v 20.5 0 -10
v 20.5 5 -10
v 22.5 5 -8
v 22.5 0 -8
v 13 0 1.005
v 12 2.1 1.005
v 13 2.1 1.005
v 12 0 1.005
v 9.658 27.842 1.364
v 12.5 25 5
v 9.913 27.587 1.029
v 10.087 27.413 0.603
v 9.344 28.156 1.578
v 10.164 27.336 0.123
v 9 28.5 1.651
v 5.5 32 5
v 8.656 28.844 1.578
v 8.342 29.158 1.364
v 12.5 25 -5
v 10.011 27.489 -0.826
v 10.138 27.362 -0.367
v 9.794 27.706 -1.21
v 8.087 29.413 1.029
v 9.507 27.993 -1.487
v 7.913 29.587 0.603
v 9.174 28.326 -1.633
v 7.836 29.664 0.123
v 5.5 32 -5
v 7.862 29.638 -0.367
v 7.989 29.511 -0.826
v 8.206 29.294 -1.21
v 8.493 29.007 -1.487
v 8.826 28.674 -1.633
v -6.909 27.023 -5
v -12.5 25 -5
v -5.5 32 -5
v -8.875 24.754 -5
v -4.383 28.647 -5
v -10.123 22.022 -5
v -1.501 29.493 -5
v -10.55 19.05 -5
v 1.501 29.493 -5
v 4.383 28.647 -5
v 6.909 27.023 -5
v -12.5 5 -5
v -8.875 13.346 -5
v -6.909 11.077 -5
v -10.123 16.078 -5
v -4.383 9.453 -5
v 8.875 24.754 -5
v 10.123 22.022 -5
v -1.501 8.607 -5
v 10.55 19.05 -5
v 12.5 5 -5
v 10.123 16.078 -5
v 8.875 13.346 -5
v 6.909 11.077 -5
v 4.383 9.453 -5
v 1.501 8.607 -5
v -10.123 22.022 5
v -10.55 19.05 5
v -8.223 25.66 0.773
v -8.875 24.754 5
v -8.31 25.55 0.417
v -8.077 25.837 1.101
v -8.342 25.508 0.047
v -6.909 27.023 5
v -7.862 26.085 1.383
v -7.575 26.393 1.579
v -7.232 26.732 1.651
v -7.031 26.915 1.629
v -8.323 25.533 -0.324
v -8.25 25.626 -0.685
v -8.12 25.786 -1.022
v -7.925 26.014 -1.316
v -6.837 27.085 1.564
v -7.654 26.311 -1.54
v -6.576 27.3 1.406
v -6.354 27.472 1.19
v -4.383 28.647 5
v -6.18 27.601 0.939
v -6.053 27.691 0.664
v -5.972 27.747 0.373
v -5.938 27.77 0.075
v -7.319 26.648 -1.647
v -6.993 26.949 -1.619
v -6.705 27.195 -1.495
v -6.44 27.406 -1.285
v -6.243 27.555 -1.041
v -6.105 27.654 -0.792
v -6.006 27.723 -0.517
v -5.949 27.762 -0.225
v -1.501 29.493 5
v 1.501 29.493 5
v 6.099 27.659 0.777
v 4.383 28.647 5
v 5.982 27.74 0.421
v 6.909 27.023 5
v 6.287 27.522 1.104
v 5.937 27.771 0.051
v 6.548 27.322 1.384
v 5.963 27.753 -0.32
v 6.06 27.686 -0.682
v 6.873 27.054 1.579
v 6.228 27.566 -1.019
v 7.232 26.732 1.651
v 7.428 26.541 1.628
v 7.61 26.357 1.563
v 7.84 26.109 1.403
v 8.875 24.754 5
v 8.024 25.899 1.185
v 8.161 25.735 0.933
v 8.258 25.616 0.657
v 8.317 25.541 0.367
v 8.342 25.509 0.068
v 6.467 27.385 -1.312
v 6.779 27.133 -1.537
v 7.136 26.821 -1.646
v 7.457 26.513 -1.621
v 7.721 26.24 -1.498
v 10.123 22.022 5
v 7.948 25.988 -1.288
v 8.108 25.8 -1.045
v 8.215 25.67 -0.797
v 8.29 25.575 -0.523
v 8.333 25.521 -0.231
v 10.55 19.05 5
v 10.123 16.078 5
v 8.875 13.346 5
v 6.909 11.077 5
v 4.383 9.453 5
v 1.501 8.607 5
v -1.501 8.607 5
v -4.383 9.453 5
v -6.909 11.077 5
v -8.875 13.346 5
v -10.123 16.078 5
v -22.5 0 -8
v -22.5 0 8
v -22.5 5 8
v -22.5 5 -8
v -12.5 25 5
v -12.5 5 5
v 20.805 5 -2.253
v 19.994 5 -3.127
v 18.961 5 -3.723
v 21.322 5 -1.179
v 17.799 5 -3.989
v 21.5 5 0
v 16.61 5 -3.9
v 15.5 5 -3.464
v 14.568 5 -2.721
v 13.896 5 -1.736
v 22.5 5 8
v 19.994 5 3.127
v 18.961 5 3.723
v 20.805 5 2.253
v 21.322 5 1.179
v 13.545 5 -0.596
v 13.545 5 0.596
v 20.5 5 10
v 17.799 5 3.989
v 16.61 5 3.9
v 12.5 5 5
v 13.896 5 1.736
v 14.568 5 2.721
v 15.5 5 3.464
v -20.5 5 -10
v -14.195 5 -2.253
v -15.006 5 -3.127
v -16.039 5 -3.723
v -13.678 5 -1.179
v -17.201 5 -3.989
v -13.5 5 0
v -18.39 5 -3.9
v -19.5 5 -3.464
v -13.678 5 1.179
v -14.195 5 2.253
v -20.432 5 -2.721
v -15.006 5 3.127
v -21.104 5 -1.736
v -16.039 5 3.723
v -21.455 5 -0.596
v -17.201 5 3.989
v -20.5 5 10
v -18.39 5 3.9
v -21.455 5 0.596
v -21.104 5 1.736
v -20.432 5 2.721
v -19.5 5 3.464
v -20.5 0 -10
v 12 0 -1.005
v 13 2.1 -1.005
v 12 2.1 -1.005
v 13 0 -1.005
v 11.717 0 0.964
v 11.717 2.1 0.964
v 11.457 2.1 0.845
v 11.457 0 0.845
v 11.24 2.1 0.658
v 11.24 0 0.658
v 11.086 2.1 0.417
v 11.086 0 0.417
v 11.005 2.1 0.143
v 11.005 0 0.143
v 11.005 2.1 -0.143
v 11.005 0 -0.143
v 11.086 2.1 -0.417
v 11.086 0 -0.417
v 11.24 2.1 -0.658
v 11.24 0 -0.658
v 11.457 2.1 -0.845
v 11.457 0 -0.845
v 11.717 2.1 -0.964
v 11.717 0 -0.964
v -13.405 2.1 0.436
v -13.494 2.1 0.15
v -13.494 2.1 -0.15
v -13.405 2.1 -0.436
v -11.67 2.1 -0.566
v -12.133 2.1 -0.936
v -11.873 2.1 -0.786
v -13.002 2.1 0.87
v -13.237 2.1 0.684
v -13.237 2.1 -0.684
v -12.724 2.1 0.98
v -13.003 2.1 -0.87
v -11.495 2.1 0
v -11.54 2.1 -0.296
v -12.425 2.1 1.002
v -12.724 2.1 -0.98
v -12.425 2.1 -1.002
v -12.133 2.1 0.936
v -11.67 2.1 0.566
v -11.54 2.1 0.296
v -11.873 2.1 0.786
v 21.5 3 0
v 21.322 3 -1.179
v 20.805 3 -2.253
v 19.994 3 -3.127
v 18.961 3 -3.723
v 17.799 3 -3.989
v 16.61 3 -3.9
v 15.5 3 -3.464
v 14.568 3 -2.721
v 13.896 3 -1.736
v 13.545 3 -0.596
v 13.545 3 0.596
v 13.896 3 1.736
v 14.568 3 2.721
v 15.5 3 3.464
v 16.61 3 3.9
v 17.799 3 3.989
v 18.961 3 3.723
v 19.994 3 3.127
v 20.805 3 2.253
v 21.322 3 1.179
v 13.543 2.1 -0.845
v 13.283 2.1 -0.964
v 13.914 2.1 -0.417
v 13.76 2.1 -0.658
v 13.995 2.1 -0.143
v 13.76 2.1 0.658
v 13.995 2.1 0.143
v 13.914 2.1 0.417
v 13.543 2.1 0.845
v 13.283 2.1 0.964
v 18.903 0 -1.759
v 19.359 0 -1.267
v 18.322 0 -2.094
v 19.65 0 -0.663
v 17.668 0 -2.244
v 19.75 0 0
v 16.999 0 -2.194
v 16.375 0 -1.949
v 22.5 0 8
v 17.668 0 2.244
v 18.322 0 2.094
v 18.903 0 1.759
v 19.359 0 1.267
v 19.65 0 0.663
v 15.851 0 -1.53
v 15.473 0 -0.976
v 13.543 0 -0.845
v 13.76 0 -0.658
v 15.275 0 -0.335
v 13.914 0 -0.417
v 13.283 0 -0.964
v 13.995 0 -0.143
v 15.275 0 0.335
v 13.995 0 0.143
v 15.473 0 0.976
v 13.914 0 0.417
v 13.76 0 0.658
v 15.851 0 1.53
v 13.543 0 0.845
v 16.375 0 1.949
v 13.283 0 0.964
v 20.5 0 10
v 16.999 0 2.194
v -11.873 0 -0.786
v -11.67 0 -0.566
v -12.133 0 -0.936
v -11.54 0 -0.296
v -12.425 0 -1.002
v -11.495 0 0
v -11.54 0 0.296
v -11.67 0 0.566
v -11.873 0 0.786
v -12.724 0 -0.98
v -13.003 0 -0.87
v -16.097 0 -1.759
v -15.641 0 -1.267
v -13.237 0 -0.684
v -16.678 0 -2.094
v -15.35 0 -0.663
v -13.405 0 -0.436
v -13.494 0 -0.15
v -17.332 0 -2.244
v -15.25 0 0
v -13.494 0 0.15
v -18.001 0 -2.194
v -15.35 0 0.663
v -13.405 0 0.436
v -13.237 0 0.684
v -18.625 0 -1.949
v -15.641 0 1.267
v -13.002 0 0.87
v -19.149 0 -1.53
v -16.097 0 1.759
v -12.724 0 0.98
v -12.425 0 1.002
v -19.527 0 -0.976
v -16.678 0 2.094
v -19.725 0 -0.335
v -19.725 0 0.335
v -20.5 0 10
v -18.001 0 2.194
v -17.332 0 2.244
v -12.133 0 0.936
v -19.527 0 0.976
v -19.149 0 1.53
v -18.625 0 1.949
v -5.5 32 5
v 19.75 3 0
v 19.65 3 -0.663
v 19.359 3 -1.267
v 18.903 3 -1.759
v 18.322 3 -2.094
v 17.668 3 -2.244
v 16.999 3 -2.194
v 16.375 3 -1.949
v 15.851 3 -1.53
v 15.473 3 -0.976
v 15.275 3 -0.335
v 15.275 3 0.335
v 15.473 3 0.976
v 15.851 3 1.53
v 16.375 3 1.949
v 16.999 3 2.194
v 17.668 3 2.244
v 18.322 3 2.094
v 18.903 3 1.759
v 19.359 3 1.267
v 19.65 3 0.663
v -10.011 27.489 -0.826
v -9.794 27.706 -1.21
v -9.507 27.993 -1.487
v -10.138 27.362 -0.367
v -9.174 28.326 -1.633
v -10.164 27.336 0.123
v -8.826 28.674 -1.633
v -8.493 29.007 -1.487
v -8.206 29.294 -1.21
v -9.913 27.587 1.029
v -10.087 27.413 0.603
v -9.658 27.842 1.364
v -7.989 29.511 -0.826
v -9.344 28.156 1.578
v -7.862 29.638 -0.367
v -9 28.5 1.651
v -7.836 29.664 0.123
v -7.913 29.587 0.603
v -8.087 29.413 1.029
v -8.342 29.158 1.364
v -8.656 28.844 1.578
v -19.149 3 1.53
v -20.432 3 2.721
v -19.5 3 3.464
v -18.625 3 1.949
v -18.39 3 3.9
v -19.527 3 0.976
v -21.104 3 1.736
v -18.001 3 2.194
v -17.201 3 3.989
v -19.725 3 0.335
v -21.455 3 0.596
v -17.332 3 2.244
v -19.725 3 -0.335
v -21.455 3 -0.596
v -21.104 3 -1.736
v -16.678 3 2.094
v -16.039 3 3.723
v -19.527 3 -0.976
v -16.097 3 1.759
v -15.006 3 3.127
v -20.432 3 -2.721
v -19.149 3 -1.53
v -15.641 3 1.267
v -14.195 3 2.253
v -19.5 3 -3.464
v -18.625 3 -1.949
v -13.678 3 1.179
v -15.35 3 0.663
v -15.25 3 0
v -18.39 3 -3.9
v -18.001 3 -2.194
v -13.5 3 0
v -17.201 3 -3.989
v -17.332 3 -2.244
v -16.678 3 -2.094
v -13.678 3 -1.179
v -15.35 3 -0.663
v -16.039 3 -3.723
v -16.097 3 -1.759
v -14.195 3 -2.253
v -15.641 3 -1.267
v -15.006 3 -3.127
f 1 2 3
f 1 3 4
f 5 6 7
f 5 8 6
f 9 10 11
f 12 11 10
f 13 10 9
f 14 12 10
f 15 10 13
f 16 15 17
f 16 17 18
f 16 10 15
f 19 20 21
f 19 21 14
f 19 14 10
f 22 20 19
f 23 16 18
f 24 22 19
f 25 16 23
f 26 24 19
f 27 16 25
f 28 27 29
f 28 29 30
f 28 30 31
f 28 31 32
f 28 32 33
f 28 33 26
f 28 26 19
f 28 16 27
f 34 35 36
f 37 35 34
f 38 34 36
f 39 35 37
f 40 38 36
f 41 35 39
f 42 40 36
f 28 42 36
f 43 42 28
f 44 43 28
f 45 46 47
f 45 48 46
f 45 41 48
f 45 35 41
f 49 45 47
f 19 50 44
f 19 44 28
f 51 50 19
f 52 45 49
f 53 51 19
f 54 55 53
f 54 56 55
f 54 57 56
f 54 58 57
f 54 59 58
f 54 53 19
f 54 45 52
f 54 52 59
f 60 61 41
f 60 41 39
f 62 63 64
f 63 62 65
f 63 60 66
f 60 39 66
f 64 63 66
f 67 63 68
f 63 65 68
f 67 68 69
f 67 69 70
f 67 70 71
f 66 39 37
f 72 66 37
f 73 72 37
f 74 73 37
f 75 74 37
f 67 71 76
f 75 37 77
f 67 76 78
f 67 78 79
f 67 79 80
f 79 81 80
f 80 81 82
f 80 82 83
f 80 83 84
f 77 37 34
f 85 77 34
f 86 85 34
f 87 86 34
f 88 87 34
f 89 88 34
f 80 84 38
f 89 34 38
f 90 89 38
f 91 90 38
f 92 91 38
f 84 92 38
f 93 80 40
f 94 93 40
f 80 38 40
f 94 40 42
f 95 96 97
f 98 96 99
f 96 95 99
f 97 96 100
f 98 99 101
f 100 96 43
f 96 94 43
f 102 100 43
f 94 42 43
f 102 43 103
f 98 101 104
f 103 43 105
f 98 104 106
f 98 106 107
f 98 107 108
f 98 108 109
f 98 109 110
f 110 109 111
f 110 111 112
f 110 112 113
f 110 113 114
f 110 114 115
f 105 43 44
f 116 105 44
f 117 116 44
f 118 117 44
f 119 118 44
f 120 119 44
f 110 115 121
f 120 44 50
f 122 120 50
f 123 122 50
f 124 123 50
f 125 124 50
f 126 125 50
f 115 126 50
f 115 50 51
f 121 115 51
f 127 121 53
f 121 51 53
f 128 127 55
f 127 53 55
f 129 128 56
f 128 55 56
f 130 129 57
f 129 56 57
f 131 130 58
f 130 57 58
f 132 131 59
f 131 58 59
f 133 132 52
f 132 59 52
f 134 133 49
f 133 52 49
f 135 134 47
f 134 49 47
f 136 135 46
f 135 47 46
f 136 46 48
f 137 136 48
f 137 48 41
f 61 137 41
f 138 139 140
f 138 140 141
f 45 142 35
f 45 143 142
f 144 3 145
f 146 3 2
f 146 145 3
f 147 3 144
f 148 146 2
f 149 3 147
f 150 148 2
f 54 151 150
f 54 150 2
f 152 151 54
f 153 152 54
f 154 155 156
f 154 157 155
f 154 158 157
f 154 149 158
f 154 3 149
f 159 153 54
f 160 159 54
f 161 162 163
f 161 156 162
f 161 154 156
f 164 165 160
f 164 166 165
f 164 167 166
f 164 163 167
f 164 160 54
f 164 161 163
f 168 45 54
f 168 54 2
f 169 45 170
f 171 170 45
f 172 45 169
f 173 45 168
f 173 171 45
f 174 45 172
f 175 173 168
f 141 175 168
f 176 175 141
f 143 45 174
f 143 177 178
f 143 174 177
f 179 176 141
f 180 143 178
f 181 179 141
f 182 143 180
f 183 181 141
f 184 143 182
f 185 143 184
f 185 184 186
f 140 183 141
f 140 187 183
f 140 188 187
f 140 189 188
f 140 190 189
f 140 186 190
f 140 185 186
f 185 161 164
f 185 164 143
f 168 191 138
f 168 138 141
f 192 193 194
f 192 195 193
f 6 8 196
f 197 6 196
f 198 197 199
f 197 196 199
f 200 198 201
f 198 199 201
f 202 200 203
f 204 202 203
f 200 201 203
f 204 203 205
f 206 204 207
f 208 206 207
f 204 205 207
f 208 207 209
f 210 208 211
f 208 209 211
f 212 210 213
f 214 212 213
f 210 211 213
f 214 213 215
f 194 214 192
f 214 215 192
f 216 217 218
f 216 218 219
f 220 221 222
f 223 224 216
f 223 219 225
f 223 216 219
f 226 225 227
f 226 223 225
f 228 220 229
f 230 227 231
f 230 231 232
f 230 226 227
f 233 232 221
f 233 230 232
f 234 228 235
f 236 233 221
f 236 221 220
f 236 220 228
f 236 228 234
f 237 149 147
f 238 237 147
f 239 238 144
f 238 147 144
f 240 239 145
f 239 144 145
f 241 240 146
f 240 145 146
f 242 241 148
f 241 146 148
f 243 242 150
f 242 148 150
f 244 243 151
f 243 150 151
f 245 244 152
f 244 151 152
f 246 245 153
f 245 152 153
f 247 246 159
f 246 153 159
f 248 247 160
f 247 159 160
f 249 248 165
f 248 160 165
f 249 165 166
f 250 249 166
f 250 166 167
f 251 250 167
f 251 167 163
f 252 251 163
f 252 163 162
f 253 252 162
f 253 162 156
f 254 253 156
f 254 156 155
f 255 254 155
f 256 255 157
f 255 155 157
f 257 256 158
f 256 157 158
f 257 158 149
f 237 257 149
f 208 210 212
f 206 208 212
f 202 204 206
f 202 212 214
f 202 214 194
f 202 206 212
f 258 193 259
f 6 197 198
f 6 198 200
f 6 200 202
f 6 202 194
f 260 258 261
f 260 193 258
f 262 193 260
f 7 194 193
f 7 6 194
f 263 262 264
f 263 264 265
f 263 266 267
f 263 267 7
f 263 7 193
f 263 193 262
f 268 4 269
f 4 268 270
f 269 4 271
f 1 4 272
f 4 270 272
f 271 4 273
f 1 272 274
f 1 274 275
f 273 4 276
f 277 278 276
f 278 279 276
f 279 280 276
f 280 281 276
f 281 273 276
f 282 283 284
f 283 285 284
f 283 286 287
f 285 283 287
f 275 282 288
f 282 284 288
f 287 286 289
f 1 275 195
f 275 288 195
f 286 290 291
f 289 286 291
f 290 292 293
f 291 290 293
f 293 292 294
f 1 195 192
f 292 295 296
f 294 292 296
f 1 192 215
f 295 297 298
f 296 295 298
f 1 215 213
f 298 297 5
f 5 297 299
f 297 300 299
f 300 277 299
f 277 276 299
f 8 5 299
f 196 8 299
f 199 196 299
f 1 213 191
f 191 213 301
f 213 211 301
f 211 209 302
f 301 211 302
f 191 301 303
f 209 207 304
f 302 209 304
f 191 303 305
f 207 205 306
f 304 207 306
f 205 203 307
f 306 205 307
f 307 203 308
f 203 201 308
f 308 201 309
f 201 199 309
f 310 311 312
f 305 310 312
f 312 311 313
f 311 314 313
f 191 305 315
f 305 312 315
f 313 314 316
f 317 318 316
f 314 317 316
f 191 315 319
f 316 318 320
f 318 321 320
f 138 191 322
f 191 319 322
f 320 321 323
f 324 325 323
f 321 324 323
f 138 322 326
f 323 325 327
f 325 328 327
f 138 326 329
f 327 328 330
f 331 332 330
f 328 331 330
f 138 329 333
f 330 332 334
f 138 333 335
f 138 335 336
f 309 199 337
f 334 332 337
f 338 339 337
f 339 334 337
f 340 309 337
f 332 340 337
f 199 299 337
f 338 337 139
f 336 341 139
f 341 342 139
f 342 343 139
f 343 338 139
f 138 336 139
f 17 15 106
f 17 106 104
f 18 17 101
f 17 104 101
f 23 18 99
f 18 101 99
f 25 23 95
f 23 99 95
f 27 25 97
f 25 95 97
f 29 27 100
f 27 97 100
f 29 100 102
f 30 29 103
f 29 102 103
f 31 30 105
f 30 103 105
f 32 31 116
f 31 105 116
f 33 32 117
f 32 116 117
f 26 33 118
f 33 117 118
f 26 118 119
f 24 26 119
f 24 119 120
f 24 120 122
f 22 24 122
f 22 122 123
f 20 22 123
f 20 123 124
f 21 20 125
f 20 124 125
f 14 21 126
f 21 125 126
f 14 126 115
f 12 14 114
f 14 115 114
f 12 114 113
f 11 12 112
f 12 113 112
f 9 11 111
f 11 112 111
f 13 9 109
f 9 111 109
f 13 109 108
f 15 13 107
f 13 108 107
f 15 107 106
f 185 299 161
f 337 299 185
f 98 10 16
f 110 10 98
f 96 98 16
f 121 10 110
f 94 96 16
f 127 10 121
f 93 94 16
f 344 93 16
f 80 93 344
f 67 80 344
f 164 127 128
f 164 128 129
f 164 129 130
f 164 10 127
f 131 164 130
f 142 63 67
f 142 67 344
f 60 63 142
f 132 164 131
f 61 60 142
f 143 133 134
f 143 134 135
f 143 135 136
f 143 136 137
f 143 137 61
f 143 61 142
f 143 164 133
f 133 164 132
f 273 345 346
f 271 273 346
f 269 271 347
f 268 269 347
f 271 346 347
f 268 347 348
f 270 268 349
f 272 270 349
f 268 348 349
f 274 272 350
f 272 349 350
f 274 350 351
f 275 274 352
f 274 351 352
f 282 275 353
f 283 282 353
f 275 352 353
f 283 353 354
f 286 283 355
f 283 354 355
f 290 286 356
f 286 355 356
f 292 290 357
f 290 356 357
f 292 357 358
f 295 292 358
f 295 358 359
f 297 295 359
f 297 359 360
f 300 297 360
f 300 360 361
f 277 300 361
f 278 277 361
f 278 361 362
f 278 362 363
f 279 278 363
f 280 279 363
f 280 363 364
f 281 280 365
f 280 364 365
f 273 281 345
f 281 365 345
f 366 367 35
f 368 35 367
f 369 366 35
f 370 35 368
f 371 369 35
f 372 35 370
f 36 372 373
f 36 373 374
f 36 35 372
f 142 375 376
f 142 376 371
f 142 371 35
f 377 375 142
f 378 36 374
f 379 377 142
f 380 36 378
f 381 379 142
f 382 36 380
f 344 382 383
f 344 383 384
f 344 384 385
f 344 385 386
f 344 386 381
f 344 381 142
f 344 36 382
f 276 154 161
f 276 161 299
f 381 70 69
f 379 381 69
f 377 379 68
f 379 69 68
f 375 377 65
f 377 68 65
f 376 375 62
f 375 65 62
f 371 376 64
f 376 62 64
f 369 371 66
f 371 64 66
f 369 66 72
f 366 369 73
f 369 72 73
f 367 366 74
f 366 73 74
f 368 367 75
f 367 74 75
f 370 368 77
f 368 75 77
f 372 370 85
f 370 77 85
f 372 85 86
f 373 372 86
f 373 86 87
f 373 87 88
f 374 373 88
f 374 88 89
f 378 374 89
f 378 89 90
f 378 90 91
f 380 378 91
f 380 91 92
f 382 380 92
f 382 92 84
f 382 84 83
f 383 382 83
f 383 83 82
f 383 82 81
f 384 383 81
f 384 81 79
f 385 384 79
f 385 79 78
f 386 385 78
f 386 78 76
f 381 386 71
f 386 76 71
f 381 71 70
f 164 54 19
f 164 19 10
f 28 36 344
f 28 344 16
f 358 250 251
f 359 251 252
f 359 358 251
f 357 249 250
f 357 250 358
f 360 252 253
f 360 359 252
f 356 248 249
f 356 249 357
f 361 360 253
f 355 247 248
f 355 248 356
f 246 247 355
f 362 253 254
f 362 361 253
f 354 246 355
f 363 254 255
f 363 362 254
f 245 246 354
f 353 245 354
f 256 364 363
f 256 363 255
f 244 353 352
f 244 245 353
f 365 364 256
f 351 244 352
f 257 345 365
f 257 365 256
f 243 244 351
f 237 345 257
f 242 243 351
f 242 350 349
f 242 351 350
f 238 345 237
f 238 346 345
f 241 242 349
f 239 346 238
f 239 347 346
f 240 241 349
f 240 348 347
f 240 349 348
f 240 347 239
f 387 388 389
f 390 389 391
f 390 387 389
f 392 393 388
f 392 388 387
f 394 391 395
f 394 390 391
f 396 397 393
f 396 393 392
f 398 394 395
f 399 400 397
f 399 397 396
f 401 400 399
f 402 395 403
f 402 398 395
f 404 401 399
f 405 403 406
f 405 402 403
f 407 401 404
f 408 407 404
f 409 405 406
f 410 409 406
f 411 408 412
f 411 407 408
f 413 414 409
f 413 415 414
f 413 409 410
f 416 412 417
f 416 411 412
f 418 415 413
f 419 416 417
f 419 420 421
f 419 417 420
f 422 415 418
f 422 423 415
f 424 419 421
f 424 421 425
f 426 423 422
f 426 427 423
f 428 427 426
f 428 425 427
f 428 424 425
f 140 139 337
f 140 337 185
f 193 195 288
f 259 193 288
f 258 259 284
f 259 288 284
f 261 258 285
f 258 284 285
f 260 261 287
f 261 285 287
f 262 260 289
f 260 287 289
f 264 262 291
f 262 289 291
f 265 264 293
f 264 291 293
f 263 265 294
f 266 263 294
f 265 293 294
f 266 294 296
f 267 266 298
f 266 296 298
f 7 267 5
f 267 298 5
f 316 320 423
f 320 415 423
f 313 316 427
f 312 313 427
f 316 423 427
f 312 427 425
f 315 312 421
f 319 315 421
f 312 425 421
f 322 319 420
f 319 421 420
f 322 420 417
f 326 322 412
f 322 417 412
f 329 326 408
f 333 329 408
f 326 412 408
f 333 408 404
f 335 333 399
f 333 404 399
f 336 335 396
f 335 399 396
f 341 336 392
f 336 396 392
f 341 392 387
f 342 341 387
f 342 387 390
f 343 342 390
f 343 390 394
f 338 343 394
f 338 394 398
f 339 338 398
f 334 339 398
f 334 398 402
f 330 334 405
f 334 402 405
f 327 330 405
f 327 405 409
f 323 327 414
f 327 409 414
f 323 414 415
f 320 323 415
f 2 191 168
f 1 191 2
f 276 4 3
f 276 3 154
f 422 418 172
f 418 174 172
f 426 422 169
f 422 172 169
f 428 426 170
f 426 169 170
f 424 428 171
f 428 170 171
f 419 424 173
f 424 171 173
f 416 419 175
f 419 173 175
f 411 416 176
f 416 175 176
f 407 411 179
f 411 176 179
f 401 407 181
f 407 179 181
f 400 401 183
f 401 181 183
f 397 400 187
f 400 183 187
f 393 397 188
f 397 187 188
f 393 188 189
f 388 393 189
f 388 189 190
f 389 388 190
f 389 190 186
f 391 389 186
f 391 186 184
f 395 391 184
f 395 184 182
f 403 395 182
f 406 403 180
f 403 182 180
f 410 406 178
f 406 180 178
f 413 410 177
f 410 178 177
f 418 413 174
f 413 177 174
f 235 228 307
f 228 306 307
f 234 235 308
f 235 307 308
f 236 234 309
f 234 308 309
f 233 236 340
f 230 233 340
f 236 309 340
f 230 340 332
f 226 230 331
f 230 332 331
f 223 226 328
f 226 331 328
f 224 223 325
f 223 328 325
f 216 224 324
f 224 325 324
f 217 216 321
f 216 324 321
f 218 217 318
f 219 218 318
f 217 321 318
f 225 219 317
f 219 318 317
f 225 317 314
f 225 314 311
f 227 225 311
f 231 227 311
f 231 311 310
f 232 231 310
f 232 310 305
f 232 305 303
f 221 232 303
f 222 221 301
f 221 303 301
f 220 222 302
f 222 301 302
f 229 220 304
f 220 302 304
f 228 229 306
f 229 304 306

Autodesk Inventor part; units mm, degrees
ref_plane "YZ Plane" through (0, 0, 0) normal (1, 0, 0) x (0, 1, 0)
ref_plane "XZ Plane" through (0, 0, 0) normal (0, 1, 0) x (-1, 0, 0)
ref_plane "XY Plane" through (0, 0, 0) normal (0, 0, 1) x (1, 0, 0)
sketch "Sketch2" plane through (0, 0, 0) normal (0, 1, 0) x (-1, 0, 0)
  line L0 (-22.5, 10) -> (22.5, 10)
  line L1 (22.5, 10) -> (22.5, -10)
  line L2 (22.5, -10) -> (-22.5, -10)
  line L3 (-22.5, -10) -> (-22.5, 10)
  line L4 (-22.5, 10) -> (22.5, -10) construction
  line L5 (22.5, 10) -> (-22.5, -10) construction
  point P0 (0, 0)
  dimension "d0" = 45
  dimension "d1" = 20
extrude "Extrusion1" add sketch "Sketch2" along normal blind 5
sketch "Sketch3" plane through (0, 5, 0) normal (0, 1, 0) x (1, 0, 0)
  line L0 (12.5, -5) -> (-12.5, -5)
  line L1 (-12.5, -5) -> (-12.5, 5)
  line L2 (-12.5, 5) -> (12.5, 5)
  line L3 (12.5, 5) -> (12.5, -5)
  line L4 (12.5, -5) -> (-12.5, 5) construction
  line L5 (-12.5, -5) -> (12.5, 5) construction
  point P0 (0, 0)
  dimension "d4" = 25
  dimension "d5" = 10
extrude "Extrusion2" add sketch "Sketch3" along normal blind 27
sketch "Sketch4" plane through (12.5, 5, -5) normal (0, 0, -1) x (-1, 0, 0)
  line L0 (35, 0) -> (-10, 0) construction
  line L1 (12.5, 0) -> (12.5, 14.05) construction
  circle A0 centre (12.5, 14.05) radius 10.55
  point P0 (12.5, -5)
  dimension "d8" = 14.05
  dimension "d9" = 21.1
extrude "Extrusion3" cut sketch "Sketch4" against normal up to surface (10 mm away)
chamfer "Chamfer1" distance 7 angle 45 2 edges at (12.5, 32, 0) (-12.5, 32, 0)
sketch "Sketch6" plane through (5.5, 32, -5) normal (0.7071, 0.7071, 0) x (-0.7071, 0.7071, 0)
  line L0 (0, 0) -> (0, 10) construction
  line L1 (-9.8995, 10) -> (-9.8995, 0) construction
  line L2 (0, 10) -> (-9.8995, 0) construction
  line L3 (-9.8995, 0) -> (-9.8995, 10) construction
  line L4 (-9.8995, 10) -> (0, 0) construction
  line L5 (0, 0) -> (-4.9497, 5) construction
  point P0 (-18.7383, 5)
hole "Hole1" at (9, 28.5, 0) direction (-0.7071, -0.7071, 0) diameter 3.302 depth 12.3 thread size "8-32 UNC" class "2B" standard "ANSI Unified Screw Threads"
sketch "Sketch7" plane through (-5.5, 32, -5) normal (-0.7071, 0.7071, 0) x (-0.7071, -0.7071, 0)
  line L0 (0, 10) -> (0, 0) construction
  line L1 (24.0416, 0) -> (9.8995, 0) construction
  line L2 (0, 10) -> (9.8995, 0) construction
  line L3 (9.8995, 0) -> (4.9497, 5) construction
  point P0 (18.7383, 5)
hole "Hole2" at (-9, 28.5, 0) direction (0.7071, -0.7071, 0) diameter 3.302 depth 12.3 thread size "8-32 UNC" class "2B" standard "ANSI Unified Screw Threads"
sketch "Sketch13" plane through (0, 5, 0) normal (0, 1, 0) x (1, 0, 0)
  line L0 (-22.5, 10) -> (-22.5, -10) construction
  line L1 (-22.5, 0) -> (-17.5, 0) construction
  line L2 (22.5, -10) -> (22.5, 10) construction
  line L3 (22.5, 0) -> (17.5, 0) construction
  circle A0 centre (17.5, 0) radius 4
  circle A1 centre (-17.5, 0) radius 4
  point P0 (0, 0)
  dimension "d69" = 5
  dimension "d70" = 5
  dimension "d71" = 8
  dimension "d72" = 8
extrude "Extrusion8" cut sketch "Sketch13" against normal blind 2
sketch "Sketch14" plane through (0, 5, 0) normal (0, 1, 0) x (1, 0, 0)
  circle A0 centre (17.5, 0) radius 4 projected
  circle A1 centre (17.5, 0) radius 2.25
  circle A2 centre (-17.5, 0) radius 4 projected
  circle A3 centre (-17.5, 0) radius 2.25
  point P0 (0, 0)
  dimension "d75" = 4.5
extrude "Extrusion9" cut sketch "Sketch14" against normal through all contours A1 | A3
sketch "Sketch15" plane through (0, 0, 0) normal (0, -1, 0) x (1, 0, 0)
  circle A0 centre (-17.5, 0) radius 2.25 construction
  line L0 (-17.5, 0) -> (-12.5, 0) construction
  circle A1 centre (17.5, 0) radius 2.25 construction
  line L1 (17.5, 0) -> (13, 0) construction
  circle A2 centre (-12.5, 0) radius 1.005
  circle A3 centre (13, 0) radius 1.005
  line L2 (13, 0) -> (12, 0) construction
  circle A4 centre (12, 0) radius 1.005
  line L3 (12, 1.005) -> (13, 1.005)
  line L4 (13, -1.005) -> (12, -1.005)
  point P0 (0, 0)
  dimension "d78" = 5
  dimension "d79" = 4.5
  dimension "d80" = 2.01
  dimension "d81" = 2.01
  dimension "d82" = 1
  dimension "d83" = 2.01
extrude "Extrusion10" cut sketch "Sketch15" against normal blind 2.1
chamfer "Chamfer3" distance 2 angle 45 4 edges at (-22.5, 2.5, 10) (22.5, 2.5, 10) (-22.5, 2.5, -10) (22.5, 2.5, -10)
properties part number "ADAPTER_I-355-03"
